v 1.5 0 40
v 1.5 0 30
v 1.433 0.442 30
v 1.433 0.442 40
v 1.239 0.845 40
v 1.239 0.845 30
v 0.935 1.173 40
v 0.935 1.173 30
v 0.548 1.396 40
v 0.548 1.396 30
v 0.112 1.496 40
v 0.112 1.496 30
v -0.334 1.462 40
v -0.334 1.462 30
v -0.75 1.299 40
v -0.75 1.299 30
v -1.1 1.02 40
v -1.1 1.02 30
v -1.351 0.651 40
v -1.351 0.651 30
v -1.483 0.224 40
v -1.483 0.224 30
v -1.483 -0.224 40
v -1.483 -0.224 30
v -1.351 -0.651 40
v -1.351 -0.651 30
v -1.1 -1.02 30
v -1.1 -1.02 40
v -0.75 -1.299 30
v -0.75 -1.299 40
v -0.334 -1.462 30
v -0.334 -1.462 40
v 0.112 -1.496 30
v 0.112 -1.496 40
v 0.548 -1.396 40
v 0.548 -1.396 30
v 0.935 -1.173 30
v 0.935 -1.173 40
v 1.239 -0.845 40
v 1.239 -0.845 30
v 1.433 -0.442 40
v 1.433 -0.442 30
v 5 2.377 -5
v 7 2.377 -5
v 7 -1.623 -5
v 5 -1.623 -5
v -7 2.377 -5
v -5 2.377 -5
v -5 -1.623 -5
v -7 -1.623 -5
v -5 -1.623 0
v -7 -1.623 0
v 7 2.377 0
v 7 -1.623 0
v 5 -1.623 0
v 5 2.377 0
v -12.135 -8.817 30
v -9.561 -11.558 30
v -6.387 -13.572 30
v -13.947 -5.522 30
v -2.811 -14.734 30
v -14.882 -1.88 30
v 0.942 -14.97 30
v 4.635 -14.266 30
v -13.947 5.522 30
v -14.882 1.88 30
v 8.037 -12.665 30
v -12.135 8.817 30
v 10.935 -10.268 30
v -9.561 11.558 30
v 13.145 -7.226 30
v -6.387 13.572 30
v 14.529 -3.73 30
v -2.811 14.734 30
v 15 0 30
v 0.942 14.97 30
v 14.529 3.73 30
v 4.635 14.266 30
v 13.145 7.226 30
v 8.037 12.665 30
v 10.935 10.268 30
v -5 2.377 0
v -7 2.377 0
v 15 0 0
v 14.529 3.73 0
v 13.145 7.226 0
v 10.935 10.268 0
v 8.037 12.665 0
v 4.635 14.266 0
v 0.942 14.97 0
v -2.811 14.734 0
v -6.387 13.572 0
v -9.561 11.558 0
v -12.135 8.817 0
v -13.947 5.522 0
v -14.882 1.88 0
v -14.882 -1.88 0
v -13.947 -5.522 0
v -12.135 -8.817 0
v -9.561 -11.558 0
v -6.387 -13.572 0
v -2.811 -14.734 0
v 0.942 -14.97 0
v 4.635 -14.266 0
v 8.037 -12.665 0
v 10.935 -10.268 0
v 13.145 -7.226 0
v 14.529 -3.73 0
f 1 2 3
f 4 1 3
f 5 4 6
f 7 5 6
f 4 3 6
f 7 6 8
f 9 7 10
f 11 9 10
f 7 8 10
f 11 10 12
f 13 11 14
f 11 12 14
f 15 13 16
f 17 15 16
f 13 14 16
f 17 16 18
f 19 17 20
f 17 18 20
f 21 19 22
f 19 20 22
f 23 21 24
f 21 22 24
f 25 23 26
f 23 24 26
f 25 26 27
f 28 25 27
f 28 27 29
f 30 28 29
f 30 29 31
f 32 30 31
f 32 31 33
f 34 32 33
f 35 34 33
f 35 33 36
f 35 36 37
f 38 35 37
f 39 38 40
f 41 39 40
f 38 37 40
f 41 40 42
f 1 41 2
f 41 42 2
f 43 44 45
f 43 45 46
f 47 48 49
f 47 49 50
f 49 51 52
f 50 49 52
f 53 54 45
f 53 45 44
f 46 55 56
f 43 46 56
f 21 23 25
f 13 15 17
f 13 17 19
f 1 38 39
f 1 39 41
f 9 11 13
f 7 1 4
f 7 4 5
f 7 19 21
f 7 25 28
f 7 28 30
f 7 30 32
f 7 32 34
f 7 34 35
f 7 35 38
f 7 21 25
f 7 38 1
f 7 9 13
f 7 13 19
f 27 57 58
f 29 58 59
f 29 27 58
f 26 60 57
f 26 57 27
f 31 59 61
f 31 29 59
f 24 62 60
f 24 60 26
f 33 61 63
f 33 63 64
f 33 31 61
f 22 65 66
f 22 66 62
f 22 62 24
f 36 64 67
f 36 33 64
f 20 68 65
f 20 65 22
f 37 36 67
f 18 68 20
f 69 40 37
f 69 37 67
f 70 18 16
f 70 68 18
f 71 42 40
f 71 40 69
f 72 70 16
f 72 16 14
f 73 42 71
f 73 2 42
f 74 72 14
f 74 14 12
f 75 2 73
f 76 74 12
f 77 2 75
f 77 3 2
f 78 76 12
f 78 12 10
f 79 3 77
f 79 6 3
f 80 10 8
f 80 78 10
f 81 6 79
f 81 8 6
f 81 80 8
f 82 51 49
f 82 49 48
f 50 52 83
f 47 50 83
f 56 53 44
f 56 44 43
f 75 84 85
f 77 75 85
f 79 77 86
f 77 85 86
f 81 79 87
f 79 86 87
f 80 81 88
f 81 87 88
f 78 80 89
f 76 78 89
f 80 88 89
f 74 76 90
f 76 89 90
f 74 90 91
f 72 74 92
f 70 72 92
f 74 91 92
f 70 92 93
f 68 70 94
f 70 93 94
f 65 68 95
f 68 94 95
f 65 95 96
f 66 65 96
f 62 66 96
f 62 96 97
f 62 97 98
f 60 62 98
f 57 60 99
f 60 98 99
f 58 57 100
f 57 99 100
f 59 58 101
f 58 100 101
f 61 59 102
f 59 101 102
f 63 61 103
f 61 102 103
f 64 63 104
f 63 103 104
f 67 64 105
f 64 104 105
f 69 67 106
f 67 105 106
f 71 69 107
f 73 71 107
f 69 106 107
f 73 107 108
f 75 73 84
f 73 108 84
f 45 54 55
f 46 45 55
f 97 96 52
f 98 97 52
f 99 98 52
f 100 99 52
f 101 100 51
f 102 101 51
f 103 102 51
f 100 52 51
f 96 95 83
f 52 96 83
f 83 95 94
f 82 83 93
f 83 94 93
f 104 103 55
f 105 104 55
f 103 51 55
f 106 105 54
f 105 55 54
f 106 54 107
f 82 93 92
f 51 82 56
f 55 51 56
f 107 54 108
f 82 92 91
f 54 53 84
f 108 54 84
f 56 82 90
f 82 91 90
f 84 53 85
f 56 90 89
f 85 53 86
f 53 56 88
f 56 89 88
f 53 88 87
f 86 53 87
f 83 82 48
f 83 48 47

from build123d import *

# Parameters (mm, degrees)
SKETCH1_R           = 15
BOSS_EXTRUDE1_DEPTH = 30
SKETCH2_R           = 1.5
BOSS_EXTRUDE2_DEPTH = 10
SKETCH3_W           = 2
SKETCH3_H           = 4
BOSS_EXTRUDE3_DEPTH = 5


with BuildPart() as part:
    # Sketch1 → Boss-Extrude1 (new body)
    with BuildSketch(Plane.XY):
        Circle(SKETCH1_R)
    extrude(amount=BOSS_EXTRUDE1_DEPTH)

    # Sketch2 → Boss-Extrude2 (add)
    with BuildSketch(Plane.XY.offset(30)):
        Circle(SKETCH2_R)
    extrude(amount=BOSS_EXTRUDE2_DEPTH)

    # Sketch3 → Boss-Extrude3 (add)
    with BuildSketch(Plane(origin=(0, 0, 0), x_dir=(-1, 0, 0), z_dir=(0, 0, -1))):
        with Locations((-6, 0.376613429)):
            Rectangle(SKETCH3_W, SKETCH3_H)
        with Locations((6, 0.376613429)):
            Rectangle(SKETCH3_W, SKETCH3_H)
    extrude(amount=BOSS_EXTRUDE3_DEPTH)


solid = part.part
